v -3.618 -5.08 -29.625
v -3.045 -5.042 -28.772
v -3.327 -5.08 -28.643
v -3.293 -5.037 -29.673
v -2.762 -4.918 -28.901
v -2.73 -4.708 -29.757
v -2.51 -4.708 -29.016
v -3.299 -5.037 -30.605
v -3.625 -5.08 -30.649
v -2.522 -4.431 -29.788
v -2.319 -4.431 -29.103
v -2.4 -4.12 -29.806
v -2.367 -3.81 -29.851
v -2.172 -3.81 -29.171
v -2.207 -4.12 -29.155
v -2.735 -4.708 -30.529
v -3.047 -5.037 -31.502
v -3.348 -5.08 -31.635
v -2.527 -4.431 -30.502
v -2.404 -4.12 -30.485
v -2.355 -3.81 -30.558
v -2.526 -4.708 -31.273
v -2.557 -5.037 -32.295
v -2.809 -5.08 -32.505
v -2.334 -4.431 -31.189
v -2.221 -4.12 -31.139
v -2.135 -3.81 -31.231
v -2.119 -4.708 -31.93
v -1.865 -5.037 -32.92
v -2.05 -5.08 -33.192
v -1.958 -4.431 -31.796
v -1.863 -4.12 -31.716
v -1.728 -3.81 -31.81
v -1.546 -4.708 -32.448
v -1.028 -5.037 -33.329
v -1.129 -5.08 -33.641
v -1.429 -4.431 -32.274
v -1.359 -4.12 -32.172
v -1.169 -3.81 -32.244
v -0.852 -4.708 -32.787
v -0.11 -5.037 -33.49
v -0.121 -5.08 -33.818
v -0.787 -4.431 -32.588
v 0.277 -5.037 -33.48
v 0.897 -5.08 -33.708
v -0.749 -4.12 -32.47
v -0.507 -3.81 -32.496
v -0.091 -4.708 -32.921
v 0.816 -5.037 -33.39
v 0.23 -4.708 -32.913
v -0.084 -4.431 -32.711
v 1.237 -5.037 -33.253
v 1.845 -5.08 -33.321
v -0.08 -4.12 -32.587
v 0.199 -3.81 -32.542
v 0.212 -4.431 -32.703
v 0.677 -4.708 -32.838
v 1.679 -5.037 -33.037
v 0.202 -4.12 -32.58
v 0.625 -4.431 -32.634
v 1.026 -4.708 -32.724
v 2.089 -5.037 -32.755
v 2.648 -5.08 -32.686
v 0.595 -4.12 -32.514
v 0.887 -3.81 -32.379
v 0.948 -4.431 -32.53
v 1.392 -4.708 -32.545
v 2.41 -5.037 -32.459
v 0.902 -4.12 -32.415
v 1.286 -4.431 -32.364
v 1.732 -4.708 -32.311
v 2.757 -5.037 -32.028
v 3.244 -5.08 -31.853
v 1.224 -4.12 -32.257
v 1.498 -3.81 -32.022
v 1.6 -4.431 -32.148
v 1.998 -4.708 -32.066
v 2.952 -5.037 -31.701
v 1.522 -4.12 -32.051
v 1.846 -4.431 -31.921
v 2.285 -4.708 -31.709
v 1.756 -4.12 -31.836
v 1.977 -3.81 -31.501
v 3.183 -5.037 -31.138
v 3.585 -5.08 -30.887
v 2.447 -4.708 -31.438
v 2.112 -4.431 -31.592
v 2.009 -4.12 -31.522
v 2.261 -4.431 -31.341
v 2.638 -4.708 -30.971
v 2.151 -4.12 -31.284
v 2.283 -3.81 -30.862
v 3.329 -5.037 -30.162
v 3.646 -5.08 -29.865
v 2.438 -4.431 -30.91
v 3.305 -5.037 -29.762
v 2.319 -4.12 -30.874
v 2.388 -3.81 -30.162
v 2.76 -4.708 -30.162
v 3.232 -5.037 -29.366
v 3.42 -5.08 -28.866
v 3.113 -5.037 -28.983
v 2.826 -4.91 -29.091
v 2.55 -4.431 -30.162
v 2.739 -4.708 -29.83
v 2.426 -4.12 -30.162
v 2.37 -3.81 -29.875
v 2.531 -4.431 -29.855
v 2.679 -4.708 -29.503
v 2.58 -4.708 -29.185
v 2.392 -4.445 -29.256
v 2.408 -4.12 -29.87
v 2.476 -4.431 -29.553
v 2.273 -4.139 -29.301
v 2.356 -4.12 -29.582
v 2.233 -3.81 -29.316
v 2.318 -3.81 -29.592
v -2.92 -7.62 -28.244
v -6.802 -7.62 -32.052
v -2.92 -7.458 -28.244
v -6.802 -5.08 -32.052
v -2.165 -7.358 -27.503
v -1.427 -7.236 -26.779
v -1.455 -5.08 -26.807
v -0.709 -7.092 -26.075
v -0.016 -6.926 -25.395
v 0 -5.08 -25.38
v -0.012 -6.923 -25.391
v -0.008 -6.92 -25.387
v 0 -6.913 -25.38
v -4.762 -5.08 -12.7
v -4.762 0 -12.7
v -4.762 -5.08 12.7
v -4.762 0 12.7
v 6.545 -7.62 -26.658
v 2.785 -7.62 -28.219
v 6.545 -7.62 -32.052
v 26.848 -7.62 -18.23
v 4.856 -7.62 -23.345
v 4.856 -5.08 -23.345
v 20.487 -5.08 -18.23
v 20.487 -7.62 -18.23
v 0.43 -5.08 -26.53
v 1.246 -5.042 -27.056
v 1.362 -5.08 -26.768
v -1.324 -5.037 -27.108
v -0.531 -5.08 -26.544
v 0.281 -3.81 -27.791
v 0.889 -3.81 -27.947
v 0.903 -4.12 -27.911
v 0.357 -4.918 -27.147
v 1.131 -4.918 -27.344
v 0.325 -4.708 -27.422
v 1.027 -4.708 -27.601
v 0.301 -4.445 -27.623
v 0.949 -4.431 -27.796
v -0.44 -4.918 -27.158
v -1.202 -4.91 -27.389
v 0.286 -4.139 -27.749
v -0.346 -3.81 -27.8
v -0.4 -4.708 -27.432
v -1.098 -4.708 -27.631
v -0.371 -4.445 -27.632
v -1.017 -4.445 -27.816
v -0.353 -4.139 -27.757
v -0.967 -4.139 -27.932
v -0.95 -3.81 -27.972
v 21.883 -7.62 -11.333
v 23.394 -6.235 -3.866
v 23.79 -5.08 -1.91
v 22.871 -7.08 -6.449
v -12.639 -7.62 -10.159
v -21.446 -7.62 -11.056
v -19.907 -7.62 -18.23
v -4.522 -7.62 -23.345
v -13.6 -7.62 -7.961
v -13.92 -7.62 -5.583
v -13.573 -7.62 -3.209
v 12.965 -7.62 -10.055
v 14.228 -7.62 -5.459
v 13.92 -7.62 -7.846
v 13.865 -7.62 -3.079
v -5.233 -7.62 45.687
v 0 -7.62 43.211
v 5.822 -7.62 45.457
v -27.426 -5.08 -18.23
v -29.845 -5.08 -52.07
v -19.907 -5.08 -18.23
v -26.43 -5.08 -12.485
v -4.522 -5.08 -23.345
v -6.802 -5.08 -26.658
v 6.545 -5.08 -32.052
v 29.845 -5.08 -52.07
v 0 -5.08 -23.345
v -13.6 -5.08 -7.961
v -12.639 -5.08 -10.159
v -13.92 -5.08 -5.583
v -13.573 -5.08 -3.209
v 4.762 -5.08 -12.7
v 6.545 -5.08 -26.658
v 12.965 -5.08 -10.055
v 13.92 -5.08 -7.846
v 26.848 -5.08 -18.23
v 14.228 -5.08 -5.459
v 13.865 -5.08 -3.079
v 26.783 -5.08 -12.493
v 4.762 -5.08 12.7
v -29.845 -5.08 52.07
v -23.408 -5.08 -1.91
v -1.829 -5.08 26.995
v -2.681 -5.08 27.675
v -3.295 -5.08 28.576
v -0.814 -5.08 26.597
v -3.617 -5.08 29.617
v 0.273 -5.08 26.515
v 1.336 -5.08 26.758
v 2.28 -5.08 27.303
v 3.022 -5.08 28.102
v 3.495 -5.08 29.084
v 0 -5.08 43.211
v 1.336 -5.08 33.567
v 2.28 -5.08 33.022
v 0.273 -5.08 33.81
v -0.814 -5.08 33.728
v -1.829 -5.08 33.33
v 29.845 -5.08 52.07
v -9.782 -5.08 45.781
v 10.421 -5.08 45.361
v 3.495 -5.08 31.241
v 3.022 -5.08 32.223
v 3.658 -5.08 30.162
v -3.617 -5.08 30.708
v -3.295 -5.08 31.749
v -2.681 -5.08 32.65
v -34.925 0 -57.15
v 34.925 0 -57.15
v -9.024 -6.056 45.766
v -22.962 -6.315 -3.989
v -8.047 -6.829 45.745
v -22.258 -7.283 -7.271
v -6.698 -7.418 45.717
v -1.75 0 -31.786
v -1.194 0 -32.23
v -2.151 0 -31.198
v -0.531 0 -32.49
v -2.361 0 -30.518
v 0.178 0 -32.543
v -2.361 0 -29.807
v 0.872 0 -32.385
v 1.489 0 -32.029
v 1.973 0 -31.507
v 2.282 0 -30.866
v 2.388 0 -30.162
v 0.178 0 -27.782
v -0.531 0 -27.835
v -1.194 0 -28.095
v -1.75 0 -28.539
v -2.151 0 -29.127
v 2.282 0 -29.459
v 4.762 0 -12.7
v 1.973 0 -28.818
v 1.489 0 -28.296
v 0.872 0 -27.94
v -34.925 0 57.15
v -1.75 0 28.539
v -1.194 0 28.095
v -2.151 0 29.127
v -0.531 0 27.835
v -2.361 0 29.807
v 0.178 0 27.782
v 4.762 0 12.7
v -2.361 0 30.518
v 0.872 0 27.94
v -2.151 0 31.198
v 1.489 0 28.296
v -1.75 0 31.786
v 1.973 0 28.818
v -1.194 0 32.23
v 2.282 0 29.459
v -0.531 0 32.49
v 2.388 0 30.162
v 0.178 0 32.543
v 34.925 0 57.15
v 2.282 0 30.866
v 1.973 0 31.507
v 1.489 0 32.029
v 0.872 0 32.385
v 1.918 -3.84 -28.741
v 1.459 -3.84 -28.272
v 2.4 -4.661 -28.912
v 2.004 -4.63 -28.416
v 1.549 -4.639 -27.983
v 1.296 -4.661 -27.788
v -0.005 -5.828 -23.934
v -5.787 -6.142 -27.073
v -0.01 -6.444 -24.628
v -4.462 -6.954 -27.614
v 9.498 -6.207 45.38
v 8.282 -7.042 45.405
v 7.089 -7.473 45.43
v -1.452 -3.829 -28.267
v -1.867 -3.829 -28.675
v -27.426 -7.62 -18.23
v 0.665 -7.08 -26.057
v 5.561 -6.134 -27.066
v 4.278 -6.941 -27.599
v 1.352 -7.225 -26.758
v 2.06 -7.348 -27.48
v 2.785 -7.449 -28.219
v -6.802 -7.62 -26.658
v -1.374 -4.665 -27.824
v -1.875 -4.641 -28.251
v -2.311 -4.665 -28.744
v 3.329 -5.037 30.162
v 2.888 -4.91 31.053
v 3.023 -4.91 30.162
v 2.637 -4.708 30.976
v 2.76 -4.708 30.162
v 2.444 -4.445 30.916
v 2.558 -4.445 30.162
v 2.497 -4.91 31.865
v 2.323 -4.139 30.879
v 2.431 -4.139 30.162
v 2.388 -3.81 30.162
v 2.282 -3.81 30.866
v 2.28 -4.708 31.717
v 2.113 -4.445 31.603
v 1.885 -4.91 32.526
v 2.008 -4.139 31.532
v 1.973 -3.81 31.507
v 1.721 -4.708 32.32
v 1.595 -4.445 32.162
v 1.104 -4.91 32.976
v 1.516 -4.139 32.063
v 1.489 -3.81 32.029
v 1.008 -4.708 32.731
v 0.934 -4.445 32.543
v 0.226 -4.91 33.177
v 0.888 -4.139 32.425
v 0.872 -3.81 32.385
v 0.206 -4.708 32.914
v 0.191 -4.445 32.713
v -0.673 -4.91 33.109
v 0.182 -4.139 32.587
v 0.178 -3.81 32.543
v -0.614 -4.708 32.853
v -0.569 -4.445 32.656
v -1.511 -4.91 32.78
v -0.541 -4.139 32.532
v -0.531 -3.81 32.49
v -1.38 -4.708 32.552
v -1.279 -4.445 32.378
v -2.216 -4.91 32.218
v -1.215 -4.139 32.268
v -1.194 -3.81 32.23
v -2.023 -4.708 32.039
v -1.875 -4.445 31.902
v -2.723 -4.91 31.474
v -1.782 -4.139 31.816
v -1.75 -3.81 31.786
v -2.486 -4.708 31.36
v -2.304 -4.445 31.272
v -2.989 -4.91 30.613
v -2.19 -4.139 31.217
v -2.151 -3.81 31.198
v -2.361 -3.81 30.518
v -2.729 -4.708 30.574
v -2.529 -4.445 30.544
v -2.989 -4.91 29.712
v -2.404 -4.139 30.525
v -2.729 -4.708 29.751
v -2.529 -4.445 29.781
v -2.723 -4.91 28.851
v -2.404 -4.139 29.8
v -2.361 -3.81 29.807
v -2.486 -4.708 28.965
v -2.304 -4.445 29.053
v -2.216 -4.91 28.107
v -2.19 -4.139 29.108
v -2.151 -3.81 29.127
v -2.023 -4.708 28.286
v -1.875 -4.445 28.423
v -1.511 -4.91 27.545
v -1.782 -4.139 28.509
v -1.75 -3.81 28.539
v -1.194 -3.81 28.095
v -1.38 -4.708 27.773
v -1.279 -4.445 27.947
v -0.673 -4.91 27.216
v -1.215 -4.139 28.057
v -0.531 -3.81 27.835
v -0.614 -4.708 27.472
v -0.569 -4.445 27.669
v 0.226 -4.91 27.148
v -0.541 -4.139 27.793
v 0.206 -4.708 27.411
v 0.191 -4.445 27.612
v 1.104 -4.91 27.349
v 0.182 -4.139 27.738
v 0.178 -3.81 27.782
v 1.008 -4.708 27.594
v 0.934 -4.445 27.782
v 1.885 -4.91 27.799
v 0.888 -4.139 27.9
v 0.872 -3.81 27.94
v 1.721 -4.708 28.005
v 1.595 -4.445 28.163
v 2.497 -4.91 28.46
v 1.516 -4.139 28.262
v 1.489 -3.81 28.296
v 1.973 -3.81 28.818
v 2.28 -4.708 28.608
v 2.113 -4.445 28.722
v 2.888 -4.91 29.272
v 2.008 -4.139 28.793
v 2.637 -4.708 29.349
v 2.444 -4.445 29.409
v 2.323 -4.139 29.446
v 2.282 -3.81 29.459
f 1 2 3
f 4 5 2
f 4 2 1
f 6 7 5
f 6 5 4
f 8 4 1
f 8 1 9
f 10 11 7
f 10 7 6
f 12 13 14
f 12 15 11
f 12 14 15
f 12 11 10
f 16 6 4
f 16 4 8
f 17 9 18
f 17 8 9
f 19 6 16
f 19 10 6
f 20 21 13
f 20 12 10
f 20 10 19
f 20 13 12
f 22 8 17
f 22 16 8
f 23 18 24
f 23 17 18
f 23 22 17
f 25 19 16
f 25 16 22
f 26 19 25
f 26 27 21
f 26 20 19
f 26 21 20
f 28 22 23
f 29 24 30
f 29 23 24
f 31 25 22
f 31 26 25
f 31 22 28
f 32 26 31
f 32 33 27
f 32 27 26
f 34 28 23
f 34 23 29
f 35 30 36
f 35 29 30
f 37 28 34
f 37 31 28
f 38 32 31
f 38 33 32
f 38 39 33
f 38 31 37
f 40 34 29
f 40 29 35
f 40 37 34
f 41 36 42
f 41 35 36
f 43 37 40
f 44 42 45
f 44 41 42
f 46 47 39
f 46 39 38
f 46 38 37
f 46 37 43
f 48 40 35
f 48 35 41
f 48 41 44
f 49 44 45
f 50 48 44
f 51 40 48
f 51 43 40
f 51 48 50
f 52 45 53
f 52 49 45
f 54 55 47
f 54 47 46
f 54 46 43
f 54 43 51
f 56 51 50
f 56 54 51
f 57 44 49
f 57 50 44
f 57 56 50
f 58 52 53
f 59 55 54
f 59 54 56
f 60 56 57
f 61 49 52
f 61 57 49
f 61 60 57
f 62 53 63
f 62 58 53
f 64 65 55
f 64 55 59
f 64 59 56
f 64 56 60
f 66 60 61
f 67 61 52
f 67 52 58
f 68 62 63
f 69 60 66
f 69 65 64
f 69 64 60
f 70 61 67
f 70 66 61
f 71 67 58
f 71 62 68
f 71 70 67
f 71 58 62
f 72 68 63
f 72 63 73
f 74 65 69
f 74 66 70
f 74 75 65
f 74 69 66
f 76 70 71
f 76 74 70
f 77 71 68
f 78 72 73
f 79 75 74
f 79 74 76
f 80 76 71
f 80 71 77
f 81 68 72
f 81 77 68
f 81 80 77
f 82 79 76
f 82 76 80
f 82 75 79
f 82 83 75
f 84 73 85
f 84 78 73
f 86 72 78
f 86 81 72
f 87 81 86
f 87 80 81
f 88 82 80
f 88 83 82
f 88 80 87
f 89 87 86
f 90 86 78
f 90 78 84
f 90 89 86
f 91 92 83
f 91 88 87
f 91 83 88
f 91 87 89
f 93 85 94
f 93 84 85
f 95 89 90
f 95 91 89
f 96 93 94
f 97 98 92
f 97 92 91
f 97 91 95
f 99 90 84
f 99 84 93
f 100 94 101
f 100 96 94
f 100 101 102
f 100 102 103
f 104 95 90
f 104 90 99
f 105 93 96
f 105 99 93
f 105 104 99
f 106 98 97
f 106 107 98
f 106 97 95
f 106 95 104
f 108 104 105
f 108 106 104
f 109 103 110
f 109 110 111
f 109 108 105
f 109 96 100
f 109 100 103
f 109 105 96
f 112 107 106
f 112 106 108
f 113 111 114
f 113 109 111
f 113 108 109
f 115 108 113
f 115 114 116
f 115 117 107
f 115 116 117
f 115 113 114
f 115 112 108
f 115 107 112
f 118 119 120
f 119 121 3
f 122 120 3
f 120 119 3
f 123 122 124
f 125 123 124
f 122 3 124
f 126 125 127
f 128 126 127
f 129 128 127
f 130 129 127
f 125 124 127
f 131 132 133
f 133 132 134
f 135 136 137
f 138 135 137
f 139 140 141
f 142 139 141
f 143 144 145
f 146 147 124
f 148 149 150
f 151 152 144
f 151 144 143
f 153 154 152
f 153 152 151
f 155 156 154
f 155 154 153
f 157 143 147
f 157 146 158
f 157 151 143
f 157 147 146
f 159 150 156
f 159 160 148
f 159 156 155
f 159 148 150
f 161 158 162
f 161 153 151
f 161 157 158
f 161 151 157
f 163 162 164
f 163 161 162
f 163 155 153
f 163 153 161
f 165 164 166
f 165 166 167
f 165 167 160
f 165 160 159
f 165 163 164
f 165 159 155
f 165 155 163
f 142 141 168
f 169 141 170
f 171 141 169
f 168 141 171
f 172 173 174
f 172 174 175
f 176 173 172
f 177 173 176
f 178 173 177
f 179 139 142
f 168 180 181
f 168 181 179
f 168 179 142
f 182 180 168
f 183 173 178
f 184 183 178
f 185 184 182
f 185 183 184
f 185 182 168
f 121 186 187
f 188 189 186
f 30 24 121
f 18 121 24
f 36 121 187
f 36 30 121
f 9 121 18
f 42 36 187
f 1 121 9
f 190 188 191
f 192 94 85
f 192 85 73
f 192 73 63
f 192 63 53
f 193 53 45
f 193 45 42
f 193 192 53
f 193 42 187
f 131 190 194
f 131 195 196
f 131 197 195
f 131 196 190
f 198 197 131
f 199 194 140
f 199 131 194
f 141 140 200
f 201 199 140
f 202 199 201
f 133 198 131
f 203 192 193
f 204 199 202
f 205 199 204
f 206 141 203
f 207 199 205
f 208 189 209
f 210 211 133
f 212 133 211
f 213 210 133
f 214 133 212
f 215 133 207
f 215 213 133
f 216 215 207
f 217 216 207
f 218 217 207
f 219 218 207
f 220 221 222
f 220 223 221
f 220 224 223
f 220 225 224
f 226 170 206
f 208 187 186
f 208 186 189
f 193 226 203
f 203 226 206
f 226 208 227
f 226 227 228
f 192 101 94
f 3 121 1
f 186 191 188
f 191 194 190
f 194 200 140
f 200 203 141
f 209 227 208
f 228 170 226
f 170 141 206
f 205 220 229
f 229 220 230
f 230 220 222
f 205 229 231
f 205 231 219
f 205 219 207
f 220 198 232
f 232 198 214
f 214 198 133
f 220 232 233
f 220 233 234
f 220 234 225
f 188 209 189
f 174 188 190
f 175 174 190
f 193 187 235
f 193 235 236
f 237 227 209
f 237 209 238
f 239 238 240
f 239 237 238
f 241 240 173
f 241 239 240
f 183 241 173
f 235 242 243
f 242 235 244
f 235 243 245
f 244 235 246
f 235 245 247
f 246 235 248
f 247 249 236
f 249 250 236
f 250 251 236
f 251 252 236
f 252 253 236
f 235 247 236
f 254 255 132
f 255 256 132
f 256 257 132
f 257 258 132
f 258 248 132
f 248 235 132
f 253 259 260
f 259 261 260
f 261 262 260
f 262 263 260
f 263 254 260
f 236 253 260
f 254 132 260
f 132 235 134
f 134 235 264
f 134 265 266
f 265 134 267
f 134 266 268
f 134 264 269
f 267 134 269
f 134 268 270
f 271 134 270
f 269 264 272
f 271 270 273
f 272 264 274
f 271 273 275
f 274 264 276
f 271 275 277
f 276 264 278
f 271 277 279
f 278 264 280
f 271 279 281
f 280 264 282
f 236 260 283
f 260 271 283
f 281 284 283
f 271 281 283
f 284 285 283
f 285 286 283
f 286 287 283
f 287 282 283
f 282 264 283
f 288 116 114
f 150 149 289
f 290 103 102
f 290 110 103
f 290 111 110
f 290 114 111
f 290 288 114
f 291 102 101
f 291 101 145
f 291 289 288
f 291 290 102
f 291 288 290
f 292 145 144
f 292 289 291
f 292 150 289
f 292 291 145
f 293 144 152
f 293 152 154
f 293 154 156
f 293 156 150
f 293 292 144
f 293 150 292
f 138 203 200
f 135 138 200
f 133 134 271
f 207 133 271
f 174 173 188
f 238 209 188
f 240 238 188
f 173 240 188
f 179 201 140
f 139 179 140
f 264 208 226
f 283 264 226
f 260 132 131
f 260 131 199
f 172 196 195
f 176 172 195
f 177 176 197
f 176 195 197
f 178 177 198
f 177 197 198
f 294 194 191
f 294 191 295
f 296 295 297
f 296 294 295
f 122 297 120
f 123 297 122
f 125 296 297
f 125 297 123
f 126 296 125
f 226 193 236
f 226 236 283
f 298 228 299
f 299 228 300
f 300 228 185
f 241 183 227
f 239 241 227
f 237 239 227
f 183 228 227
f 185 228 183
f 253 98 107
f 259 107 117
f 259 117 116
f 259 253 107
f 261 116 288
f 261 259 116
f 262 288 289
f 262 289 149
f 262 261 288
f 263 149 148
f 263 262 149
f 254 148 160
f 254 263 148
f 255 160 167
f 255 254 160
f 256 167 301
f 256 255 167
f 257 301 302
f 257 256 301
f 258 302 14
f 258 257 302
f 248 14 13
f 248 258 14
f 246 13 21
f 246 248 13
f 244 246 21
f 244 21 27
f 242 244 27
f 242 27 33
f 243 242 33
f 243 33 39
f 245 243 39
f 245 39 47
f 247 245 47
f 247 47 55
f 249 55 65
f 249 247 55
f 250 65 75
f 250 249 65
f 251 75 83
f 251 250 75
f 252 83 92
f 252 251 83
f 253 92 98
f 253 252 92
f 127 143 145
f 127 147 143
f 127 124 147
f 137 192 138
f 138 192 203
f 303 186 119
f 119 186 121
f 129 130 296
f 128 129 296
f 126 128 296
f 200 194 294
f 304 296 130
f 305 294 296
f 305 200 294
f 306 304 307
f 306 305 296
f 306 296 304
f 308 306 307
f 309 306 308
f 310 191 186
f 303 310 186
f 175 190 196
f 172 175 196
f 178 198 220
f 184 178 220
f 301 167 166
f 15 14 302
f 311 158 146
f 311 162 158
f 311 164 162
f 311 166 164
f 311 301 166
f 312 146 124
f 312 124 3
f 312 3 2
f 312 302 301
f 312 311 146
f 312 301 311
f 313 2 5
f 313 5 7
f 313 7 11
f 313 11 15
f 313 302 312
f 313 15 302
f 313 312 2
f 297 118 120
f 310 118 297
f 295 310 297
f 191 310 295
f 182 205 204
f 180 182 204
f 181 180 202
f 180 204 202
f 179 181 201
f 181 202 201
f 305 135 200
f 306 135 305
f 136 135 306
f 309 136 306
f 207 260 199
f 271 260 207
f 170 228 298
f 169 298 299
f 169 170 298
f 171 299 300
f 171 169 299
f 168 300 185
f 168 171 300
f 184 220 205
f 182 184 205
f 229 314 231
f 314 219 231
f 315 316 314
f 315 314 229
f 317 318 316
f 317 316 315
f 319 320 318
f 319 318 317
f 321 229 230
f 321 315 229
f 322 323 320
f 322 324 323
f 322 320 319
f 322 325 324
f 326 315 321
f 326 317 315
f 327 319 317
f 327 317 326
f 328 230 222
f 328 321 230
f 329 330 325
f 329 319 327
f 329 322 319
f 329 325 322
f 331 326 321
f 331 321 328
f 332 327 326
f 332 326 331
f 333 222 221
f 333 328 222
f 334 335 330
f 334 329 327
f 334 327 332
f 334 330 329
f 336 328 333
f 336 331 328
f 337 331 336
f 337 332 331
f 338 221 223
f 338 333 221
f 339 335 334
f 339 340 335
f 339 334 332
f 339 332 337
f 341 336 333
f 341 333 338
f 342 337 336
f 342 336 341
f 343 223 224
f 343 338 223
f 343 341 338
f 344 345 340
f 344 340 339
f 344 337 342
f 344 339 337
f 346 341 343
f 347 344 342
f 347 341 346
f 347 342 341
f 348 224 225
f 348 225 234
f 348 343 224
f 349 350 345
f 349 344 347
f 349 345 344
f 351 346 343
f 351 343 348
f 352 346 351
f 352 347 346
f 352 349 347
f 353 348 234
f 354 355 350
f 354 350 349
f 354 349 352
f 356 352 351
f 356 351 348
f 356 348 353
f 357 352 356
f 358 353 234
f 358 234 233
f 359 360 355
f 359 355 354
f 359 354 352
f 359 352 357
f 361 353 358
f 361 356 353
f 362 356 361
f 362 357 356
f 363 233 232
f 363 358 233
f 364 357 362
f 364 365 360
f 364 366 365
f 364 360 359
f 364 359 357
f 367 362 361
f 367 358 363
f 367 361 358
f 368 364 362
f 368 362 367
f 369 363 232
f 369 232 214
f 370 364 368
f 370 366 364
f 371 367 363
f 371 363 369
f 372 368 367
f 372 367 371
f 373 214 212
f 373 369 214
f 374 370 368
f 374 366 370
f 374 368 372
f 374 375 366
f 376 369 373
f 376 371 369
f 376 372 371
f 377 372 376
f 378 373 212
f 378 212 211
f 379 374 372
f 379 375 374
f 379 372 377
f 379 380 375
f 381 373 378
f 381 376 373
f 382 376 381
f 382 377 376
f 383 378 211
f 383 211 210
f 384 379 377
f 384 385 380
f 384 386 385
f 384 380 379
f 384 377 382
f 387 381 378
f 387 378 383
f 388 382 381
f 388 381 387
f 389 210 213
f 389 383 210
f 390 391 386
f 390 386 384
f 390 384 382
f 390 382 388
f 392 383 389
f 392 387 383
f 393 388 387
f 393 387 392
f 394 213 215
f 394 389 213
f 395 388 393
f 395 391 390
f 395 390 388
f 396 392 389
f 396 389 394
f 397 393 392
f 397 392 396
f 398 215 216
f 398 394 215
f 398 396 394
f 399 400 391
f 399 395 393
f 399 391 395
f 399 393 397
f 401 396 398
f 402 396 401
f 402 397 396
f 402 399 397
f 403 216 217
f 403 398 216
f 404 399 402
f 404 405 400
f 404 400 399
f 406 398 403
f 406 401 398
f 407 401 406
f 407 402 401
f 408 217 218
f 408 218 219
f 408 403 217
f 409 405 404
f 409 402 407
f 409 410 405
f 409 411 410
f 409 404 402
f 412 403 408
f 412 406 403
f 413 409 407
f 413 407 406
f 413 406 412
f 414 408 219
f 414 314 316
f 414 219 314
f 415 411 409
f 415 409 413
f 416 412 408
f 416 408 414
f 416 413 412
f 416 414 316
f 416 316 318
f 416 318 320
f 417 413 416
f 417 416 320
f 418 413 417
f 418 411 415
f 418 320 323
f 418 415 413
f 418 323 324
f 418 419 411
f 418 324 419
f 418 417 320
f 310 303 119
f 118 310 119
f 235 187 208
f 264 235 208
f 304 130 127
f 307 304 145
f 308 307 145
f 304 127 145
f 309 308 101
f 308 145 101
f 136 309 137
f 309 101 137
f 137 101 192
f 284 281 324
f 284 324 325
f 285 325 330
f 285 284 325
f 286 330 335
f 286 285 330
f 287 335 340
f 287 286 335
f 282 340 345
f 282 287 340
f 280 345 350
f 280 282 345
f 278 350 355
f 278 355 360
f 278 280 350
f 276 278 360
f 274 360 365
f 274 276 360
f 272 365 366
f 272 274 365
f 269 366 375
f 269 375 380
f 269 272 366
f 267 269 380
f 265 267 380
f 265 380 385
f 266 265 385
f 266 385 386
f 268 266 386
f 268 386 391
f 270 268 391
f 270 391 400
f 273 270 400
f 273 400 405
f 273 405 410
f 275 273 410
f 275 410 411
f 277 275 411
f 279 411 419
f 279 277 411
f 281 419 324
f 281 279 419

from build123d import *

# Parameters (mm, degrees)
F0_W         = 69.85
F0_H         = 114.3
F0_R         = 2.3876
F0_W_2       = 9.525
F0_H_2       = 25.4
F1_DEPTH     = 5.08
F2_SIZE      = 5.07999
F4_DEPTH     = 2.54
F5_T1_DEPTH  = 71.5966436916
F5_T3_DEPTH  = 71.1214770669
F5_T8_DEPTH  = 29.3324993846
F5_T14_DEPTH = 29.5628780991
F6_R         = 1.27


# Not quite as in the source:
# - a fillet or chamfer that OpenCascade refuses, or shapes differently, is made with other operations: its cross-section is extruded or revolved along the edge and cut away or added
# - a fillet or chamfer is up to 0.001 mm smaller than in the source, because OpenCascade refuses the exact size


with BuildPart() as f1:
    # F0 (on Front) → F1 (new body)
    with BuildSketch(Plane.XZ):
        Rectangle(F0_W, F0_H)
        with Locations((0, -30.1625)):
            Circle(F0_R, mode=Mode.SUBTRACT)
        Rectangle(F0_W_2, F0_H_2, mode=Mode.SUBTRACT)
        with Locations((0, 30.1625)):
            Circle(F0_R, mode=Mode.SUBTRACT)
    extrude(amount=F1_DEPTH)

    # F2 (size 5.08 in the source; OpenCascade refuses exactly that, so slightly less here)
    f2_edges = [f1.edges().sort_by_distance(p)[0] for p in [
        (0, -5.08, 57.15),
        (34.925, -5.08, 0),
        (0, -5.08, -57.15),
        (-34.925, -5.08, 0),
    ]]
    chamfer(f2_edges, length=F2_SIZE)

    # F3 (on face) → F4 (join)
    with BuildSketch(Plane.XZ.offset(5.08)):
        with BuildLine():
            Line((10.4210752899, 45.360866621), (-9.7815324138, 45.7814973))
            Line((-9.7815324138, 45.7814973), (-23.4081424498, -1.9095465541))
            Line((-23.4081424498, -1.9095465541), (-19.9071371743, -18.2295814157))
            Line((-19.9071371743, -18.2295814157), (-4.5221770743, -23.345419034))
            Line((-4.5221770743, -23.345419034), (-12.6387388145, -10.1591296217))
            ThreePointArc((-12.6387388145, -10.1591296217), (-13.8432881685, -6.7829644544), (-13.5732137506, -3.2085427961))
            Line((-13.5732137506, -3.2085427961), (0, 43.2110093534))
            Line((0, 43.2110093534), (13.8653954743, -3.0792306258))
            ThreePointArc((13.8653954743, -3.0792306258), (14.1574638309, -6.6629312481), (12.9648391888, -10.0549602188))
            Line((12.9648391888, -10.0549602188), (4.856493974, -23.345419034))
            Line((4.856493974, -23.345419034), (20.4867540311, -18.2295814157))
            Line((20.4867540311, -18.2295814157), (23.789614439, -1.9095465541))
            Line((23.789614439, -1.9095465541), (10.4210752899, 45.360866621))
        make_face()
        Polygon((6.5450641223, -26.6576724823), (0, -23.345419034), (-6.802264601, -26.6576724823), (-27.4259783328, -18.2295814157), (-6.802264601, -32.0519991219), (0, -25.3795739263), (6.5450641223, -32.0519991219), (26.8477257341, -18.2295814157), align=None)
    extrude(amount=F4_DEPTH)

    # F5: fillet of radius 5.08 on 4 edges, made by hand

    # F5_s2 → F5_t1 (cut)
    with BuildSketch(Plane(origin=(14.3770362631, 0, 50.317420481), x_dir=(0, 1, 0), z_dir=(-0.2747322653, 0, -0.9615207655))):
        with BuildLine():
            ThreePointArc((-5.08, -21.9828009958), (-6.9394090512, -20.1233919446), (-7.62, -17.5833919446))
            Line((-7.62, -17.5833919446), (-7.62, -21.9828009958))
            Line((-7.62, -21.9828009958), (-5.08, -21.9828009958))
        make_face()
    extrude(amount=F5_T1_DEPTH, mode=Mode.SUBTRACT)

    # F5_s4 → F5_t3 (cut)
    with BuildSketch(Plane(origin=(5.2549558521, 0, -18.5812325171), x_dir=(0, 1, 0), z_dir=(-0.27213626, 0, 0.9622587261))):
        with BuildLine():
            ThreePointArc((-5.08, -22.3721072272), (-6.9394090512, -20.5126981759), (-7.62, -17.9726981759))
            Line((-7.62, -17.9726981759), (-7.62, -22.3721072272))
            Line((-7.62, -22.3721072272), (-5.08, -22.3721072272))
        make_face()
    extrude(amount=F5_T3_DEPTH, mode=Mode.SUBTRACT)


with BuildPart() as f5_tool6:
    # F5_s7 → F5_t8 (new body)
    with BuildSketch(Plane(origin=(25.7640738936, 0, -13.0383967217), x_dir=(0, 1, 0), z_dir=(-0.8922507056, 0, 0.4515403396))):
        with BuildLine():
            ThreePointArc((-5.08, 20.8299666066), (-6.9394090512, 22.6893756578), (-7.62, 25.2293756578))
            Line((-7.62, 25.2293756578), (-7.62, 20.8299666066))
            Line((-7.62, 20.8299666066), (-5.08, 20.8299666066))
        make_face()
    extrude(amount=F5_T8_DEPTH)

    split(bisect_by=Plane(origin=(10.401612722, 0, -25.0567324961), x_dir=(0, 1, 0), z_dir=(-0.3833998348, 0, 0.9235824634)), keep=Keep.TOP)

    split(bisect_by=Plane(origin=(9.1889369632, 0, -18.8710138282), x_dir=(0, 1, 0), z_dir=(0.4377909897, 0, -0.8990767761)), keep=Keep.TOP)


with BuildPart() as f1_1:
    add(f1.part)

    # F5_t5: cut F5_tool6
    add(f5_tool6.part, mode=Mode.SUBTRACT)


with BuildPart() as f5_tool12:
    # F5_s13 → F5_t14 (new body)
    with BuildSketch(Plane(origin=(0.6995793032, 0, 0.3406489008), x_dir=(0, 1, 0), z_dir=(-0.8990767761, 0, -0.4377909897))):
        with BuildLine():
            ThreePointArc((-5.08, 20.9893240819), (-6.9394090512, 22.8487331332), (-7.62, 25.3887331332))
            Line((-7.62, 25.3887331332), (-7.62, 20.9893240819))
            Line((-7.62, 20.9893240819), (-5.08, 20.9893240819))
        make_face()
    extrude(amount=F5_T14_DEPTH)

    split(bisect_by=Plane(origin=(-9.4055701954, 0, -18.5855524032), x_dir=(0, 1, 0), z_dir=(-0.4515403396, 0, -0.8922507056)), keep=Keep.TOP)

    split(bisect_by=Plane(origin=(-10.3083950149, 0, -25.2248565112), x_dir=(0, 1, 0), z_dir=(0.3782912807, 0, 0.9256866138)), keep=Keep.TOP)


with BuildPart() as f1_2:
    add(f1_1.part)

    # F5_t11: cut F5_tool12
    add(f5_tool12.part, mode=Mode.SUBTRACT)

    # F6
    f6_edges = [f1_2.edges().sort_by_distance(p)[0] for p in [
        (-2.3876, -5.08, 30.1625),
        (-2.3876, -5.08, -30.1625),
    ]]
    fillet(f6_edges, radius=F6_R)


solid = f1_2.part
